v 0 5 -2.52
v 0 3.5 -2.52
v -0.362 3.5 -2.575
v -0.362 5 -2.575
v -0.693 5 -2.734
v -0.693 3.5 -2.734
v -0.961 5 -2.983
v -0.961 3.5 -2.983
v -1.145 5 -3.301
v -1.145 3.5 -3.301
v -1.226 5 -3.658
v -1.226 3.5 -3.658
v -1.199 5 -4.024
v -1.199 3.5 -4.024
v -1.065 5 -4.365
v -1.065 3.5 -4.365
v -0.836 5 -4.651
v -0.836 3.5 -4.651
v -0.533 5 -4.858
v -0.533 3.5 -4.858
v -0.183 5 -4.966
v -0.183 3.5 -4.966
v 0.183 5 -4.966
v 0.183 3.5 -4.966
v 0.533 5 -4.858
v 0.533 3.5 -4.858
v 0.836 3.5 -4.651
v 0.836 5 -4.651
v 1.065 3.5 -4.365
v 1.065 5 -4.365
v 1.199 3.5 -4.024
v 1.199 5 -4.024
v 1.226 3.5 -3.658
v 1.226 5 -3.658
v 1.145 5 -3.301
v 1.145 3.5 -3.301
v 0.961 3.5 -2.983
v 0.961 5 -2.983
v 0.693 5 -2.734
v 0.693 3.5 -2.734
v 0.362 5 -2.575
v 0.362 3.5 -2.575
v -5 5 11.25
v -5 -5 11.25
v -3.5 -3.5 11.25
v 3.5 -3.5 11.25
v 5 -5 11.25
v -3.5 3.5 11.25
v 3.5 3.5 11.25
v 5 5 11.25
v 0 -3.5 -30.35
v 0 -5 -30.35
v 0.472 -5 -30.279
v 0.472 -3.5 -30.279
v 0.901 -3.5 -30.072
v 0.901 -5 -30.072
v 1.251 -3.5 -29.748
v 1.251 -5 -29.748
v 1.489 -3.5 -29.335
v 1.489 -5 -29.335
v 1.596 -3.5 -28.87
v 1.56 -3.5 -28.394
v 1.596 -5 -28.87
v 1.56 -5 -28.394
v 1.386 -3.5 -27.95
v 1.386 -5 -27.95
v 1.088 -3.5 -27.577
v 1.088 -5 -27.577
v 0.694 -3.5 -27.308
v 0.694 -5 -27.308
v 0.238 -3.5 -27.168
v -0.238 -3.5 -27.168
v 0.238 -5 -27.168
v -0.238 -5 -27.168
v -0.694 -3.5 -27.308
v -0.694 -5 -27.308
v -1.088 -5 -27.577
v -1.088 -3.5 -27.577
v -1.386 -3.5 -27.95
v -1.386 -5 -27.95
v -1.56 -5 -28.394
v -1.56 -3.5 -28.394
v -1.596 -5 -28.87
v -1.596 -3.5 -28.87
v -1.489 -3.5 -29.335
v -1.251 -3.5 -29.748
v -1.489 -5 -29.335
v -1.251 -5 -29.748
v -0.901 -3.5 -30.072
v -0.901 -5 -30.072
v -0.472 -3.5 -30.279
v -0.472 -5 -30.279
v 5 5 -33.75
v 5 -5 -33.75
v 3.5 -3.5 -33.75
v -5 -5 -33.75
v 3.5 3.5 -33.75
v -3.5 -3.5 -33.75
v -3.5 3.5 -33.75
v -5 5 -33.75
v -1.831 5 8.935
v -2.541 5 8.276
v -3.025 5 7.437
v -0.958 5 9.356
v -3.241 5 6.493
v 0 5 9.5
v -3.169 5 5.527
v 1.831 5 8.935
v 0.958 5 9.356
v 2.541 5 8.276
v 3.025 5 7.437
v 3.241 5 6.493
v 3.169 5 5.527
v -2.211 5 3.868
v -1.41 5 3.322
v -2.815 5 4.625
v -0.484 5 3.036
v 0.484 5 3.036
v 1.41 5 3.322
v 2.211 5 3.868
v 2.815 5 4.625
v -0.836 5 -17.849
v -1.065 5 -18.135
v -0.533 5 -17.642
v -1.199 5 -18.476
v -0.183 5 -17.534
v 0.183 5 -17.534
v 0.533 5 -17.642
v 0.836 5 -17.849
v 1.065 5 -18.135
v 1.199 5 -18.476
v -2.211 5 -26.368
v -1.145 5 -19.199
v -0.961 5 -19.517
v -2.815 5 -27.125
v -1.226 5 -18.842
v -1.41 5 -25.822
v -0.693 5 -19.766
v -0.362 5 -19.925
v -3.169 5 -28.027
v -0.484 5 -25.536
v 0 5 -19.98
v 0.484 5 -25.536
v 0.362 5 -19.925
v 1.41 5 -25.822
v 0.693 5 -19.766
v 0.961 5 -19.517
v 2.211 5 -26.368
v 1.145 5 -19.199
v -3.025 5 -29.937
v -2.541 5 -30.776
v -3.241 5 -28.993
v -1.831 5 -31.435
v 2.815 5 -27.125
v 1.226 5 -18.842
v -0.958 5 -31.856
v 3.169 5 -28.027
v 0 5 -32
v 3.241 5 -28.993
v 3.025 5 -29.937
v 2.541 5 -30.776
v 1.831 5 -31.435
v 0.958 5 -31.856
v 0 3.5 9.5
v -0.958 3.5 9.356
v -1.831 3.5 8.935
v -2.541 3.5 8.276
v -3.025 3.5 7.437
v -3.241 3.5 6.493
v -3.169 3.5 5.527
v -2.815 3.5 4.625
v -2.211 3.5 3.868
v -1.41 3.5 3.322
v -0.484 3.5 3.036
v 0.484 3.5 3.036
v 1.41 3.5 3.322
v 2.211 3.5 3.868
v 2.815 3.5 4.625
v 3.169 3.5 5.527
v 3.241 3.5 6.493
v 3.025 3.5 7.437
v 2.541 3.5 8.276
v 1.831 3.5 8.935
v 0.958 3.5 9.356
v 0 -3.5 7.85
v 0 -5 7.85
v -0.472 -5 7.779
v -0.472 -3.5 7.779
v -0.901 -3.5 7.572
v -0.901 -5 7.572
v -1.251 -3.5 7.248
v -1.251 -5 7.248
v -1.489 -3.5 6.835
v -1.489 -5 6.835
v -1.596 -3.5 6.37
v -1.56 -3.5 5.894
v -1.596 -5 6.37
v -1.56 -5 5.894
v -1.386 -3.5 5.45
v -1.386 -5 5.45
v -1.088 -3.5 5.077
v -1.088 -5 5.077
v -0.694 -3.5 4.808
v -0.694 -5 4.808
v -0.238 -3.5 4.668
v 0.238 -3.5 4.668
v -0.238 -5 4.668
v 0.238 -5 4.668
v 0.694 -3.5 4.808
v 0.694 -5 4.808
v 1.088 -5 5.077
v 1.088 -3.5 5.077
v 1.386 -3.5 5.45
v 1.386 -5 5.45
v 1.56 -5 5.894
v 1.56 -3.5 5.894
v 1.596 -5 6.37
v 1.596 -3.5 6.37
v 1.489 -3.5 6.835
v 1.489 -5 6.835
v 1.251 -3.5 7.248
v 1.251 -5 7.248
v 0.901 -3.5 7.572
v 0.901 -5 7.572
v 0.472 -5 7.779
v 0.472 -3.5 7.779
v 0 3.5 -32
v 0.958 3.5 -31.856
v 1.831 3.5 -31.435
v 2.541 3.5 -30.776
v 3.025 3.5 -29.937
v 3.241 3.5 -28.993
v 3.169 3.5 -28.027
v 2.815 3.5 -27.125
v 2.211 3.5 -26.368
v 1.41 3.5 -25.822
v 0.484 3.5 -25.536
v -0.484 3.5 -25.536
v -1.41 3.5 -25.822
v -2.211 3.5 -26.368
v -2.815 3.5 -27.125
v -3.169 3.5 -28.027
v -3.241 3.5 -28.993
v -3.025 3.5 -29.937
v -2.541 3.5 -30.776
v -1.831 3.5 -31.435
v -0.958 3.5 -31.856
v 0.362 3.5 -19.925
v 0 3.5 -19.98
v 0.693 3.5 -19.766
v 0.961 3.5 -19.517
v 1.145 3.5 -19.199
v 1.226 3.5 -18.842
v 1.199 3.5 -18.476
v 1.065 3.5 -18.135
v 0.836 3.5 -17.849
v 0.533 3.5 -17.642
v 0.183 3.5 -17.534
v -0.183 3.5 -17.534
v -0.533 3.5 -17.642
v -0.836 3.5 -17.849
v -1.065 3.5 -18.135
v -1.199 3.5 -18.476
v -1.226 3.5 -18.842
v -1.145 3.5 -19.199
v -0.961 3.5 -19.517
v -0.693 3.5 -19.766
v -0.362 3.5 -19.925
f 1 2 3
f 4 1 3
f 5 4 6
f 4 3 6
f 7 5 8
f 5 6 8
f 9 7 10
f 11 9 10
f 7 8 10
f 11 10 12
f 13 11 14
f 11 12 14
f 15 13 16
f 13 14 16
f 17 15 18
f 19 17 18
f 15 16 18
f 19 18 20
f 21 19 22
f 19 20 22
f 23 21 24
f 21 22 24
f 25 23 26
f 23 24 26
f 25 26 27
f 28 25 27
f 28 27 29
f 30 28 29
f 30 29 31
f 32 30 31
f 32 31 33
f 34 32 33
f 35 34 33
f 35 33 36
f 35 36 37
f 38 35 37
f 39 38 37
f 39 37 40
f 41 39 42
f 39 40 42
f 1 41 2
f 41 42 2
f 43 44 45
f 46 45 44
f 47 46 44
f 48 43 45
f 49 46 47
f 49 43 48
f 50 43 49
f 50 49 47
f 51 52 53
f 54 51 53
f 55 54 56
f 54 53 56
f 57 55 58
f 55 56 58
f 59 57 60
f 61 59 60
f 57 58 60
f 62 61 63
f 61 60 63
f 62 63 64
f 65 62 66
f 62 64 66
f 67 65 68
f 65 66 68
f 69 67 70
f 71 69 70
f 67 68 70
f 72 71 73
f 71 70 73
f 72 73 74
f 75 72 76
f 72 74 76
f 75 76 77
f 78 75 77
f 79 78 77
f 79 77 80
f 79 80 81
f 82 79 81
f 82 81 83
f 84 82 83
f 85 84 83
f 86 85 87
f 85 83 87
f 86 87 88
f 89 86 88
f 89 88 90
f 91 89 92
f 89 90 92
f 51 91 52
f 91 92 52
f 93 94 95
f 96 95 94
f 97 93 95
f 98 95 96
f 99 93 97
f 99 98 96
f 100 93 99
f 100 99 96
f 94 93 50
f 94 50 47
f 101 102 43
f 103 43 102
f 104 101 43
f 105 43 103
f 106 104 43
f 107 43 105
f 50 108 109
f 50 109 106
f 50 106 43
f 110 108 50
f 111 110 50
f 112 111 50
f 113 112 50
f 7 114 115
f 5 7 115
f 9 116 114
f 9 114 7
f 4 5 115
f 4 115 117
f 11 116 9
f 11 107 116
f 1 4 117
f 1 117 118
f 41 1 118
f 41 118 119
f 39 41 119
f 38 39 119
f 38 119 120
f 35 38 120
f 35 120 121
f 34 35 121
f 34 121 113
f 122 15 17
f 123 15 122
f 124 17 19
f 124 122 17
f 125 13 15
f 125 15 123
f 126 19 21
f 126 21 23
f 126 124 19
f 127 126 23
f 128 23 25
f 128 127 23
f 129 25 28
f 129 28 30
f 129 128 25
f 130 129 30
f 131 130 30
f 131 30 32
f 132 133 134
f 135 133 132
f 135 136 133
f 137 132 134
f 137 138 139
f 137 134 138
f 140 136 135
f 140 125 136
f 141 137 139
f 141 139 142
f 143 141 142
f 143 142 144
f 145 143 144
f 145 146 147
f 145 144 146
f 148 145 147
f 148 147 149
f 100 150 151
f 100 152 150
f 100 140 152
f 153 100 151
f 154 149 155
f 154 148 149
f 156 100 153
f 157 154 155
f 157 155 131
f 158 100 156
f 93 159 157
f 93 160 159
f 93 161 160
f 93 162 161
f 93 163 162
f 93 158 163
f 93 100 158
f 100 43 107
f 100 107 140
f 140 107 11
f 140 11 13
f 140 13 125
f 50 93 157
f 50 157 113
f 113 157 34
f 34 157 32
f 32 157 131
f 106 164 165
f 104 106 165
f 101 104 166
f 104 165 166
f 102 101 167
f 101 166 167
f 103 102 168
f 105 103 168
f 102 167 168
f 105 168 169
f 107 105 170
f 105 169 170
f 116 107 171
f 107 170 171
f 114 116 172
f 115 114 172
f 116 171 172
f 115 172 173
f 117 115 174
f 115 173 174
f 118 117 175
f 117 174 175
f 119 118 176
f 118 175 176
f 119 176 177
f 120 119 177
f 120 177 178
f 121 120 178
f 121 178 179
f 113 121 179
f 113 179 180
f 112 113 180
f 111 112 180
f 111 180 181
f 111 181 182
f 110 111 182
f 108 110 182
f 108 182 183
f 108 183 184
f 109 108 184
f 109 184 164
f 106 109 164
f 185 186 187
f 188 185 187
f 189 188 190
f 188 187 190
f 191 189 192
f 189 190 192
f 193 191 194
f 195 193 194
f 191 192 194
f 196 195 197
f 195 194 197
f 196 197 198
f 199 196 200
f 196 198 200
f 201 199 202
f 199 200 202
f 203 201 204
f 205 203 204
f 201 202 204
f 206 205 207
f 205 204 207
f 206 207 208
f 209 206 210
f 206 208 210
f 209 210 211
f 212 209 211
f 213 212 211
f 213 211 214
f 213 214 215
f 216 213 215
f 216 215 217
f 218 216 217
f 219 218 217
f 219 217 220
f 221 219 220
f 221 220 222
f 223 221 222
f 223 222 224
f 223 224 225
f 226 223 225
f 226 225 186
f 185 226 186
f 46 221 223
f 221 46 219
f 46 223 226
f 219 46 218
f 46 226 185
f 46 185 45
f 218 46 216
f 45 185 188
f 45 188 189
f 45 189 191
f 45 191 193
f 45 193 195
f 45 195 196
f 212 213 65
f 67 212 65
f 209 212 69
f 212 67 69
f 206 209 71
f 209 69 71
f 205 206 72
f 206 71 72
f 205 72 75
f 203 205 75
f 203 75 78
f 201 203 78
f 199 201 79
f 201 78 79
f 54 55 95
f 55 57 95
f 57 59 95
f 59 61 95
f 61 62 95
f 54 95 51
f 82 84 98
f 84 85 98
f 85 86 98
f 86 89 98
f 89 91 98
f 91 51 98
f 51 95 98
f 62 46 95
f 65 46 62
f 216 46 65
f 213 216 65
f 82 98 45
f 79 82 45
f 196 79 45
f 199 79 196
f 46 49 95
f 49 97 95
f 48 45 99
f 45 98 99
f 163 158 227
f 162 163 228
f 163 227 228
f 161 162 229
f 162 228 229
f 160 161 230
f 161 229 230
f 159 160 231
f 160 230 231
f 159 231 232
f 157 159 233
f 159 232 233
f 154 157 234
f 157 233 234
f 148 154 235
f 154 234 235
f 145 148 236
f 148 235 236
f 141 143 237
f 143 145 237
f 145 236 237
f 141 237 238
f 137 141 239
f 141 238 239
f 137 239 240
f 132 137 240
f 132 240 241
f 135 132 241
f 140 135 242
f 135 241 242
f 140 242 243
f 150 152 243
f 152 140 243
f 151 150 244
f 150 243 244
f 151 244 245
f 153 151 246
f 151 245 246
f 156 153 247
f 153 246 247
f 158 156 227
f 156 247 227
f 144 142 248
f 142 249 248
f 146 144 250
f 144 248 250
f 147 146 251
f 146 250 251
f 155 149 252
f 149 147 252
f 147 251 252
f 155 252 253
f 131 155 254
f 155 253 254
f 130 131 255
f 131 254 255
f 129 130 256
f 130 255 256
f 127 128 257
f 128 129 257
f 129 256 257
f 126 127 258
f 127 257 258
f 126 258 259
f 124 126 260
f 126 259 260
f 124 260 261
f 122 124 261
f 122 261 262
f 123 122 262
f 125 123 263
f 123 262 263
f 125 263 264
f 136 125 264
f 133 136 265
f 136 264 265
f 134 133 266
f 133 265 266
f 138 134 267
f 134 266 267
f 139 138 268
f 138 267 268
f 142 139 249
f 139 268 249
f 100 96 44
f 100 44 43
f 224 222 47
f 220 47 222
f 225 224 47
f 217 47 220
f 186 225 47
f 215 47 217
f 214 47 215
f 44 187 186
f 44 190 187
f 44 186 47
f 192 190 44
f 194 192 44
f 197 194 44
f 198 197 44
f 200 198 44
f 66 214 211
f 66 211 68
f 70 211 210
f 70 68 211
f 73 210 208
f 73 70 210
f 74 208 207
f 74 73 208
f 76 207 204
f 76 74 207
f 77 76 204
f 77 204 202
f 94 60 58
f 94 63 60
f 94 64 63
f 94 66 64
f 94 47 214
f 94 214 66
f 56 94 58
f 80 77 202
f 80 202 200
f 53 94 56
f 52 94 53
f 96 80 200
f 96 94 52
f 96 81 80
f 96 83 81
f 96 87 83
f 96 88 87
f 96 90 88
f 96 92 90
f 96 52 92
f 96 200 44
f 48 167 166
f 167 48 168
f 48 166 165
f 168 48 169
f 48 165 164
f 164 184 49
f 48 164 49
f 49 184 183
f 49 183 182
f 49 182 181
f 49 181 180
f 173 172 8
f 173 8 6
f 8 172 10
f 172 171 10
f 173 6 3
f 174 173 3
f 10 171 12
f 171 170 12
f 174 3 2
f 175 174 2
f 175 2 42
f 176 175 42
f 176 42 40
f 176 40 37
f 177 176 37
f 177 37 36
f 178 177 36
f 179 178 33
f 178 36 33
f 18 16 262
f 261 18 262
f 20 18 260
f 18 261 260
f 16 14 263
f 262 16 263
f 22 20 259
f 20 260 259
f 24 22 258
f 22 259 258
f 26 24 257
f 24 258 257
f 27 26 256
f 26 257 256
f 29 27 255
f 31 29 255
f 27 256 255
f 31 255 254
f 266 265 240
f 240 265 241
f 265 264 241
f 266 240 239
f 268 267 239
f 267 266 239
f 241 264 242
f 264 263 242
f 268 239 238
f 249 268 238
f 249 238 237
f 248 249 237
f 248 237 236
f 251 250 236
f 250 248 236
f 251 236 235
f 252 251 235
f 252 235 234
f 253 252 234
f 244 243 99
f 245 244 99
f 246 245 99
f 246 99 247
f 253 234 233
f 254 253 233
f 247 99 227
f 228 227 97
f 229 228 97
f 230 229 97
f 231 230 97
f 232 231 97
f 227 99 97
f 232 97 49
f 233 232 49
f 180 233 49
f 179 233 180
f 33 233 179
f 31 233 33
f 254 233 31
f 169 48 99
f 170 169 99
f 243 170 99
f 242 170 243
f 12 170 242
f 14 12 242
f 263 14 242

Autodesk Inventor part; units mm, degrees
ref_plane "YZ Plane" through (0, 0, 0) normal (1, 0, 0) x (0, 1, 0)
ref_plane "XZ Plane" through (0, 0, 0) normal (0, 1, 0) x (-1, 0, 0)
ref_plane "XY Plane" through (0, 0, 0) normal (0, 0, 1) x (1, 0, 0)
sketch "Náčrt1" plane through (0, 0, 0) normal (0, 0, 1) x (1, 0, 0)
  line L0 (0, 7) -> (0, -7) projected
  line L1 (-7, 0) -> (7, 0) projected
  line L2 (-3.5, 3.5) -> (3.5, 3.5)
  line L3 (3.5, 3.5) -> (3.5, -3.5)
  line L4 (3.5, -3.5) -> (-3.5, -3.5)
  line L5 (-3.5, -3.5) -> (-3.5, 3.5)
  line L6 (-5, 5) -> (5, 5)
  line L7 (5, 5) -> (5, -5)
  line L8 (5, -5) -> (-5, -5)
  line L9 (-5, -5) -> (-5, 5)
  point P0 (0, 0)
  dimension "d1" = 10
  dimension "d2" = 10
  dimension "d3" = 1.5
  dimension "d4" = 1.5
  dimension "d5" = 1.5
  dimension "d6" = 1.5
extrude "Vysunutí1" add sketch "Náčrt1" along normal mid plane 22.5 contours L6 L7 L1 L3 L2 L0 | L0 L2 L5 L1 L9 L6 | L1 L5 L4 L0 L8 L9 | L7 L8 L0 L4 L3 L1
sketch "Náčrt2" plane through (-5, 5, 11.25) normal (0, 1, 0) x (1, 0, 0)
  line L0 (12, 11.25) -> (-2, 11.25) projected
  line L1 (5, 27) -> (5, -4.5) projected
  line L2 (10, 0) -> (0, 0) projected
  line L3 (0, 22.5) -> (0, 0) projected
  point P0 (5, 11.25)
  point P1 (5, 5)
  dimension "d10" = 5
  dimension "d11" = 5
hole "Díra1" at (0, 5, 6.25) direction (0, -1, 0) diameter 3.2 end through all counterbore diameter 6.5 counterbore depth 2
sketch "Náčrt3" plane through (-5, 5, 11.25) normal (0, 1, 0) x (1, 0, 0)
  line L0 (0, 22.5) -> (0, 0) projected
  line L1 (0, 22.5) -> (10, 22.5) projected
  point P0 (5, 11.25)
  point P1 (5, 15)
  point P2 (5, 3)
  dimension "d19" = 5
  dimension "d20" = 5
  dimension "d21" = 12
  dimension "d22" = 7.5
hole "Díra2" at (0, 5, -3.75) at (0, 5, 8.25) direction (0, -1, 0) diameter 2.459 depth 1.5 thread size "M3x0.5" class "6H" standard "ISO Metric profile"
mirror "Zrcadlit1" about plane through (0, 0, -11.25) normal (0, 0, -1) of "Vysunutí1", "Díra1", "Díra2"
properties part number "bearing_base" material "Hliník 6061"
